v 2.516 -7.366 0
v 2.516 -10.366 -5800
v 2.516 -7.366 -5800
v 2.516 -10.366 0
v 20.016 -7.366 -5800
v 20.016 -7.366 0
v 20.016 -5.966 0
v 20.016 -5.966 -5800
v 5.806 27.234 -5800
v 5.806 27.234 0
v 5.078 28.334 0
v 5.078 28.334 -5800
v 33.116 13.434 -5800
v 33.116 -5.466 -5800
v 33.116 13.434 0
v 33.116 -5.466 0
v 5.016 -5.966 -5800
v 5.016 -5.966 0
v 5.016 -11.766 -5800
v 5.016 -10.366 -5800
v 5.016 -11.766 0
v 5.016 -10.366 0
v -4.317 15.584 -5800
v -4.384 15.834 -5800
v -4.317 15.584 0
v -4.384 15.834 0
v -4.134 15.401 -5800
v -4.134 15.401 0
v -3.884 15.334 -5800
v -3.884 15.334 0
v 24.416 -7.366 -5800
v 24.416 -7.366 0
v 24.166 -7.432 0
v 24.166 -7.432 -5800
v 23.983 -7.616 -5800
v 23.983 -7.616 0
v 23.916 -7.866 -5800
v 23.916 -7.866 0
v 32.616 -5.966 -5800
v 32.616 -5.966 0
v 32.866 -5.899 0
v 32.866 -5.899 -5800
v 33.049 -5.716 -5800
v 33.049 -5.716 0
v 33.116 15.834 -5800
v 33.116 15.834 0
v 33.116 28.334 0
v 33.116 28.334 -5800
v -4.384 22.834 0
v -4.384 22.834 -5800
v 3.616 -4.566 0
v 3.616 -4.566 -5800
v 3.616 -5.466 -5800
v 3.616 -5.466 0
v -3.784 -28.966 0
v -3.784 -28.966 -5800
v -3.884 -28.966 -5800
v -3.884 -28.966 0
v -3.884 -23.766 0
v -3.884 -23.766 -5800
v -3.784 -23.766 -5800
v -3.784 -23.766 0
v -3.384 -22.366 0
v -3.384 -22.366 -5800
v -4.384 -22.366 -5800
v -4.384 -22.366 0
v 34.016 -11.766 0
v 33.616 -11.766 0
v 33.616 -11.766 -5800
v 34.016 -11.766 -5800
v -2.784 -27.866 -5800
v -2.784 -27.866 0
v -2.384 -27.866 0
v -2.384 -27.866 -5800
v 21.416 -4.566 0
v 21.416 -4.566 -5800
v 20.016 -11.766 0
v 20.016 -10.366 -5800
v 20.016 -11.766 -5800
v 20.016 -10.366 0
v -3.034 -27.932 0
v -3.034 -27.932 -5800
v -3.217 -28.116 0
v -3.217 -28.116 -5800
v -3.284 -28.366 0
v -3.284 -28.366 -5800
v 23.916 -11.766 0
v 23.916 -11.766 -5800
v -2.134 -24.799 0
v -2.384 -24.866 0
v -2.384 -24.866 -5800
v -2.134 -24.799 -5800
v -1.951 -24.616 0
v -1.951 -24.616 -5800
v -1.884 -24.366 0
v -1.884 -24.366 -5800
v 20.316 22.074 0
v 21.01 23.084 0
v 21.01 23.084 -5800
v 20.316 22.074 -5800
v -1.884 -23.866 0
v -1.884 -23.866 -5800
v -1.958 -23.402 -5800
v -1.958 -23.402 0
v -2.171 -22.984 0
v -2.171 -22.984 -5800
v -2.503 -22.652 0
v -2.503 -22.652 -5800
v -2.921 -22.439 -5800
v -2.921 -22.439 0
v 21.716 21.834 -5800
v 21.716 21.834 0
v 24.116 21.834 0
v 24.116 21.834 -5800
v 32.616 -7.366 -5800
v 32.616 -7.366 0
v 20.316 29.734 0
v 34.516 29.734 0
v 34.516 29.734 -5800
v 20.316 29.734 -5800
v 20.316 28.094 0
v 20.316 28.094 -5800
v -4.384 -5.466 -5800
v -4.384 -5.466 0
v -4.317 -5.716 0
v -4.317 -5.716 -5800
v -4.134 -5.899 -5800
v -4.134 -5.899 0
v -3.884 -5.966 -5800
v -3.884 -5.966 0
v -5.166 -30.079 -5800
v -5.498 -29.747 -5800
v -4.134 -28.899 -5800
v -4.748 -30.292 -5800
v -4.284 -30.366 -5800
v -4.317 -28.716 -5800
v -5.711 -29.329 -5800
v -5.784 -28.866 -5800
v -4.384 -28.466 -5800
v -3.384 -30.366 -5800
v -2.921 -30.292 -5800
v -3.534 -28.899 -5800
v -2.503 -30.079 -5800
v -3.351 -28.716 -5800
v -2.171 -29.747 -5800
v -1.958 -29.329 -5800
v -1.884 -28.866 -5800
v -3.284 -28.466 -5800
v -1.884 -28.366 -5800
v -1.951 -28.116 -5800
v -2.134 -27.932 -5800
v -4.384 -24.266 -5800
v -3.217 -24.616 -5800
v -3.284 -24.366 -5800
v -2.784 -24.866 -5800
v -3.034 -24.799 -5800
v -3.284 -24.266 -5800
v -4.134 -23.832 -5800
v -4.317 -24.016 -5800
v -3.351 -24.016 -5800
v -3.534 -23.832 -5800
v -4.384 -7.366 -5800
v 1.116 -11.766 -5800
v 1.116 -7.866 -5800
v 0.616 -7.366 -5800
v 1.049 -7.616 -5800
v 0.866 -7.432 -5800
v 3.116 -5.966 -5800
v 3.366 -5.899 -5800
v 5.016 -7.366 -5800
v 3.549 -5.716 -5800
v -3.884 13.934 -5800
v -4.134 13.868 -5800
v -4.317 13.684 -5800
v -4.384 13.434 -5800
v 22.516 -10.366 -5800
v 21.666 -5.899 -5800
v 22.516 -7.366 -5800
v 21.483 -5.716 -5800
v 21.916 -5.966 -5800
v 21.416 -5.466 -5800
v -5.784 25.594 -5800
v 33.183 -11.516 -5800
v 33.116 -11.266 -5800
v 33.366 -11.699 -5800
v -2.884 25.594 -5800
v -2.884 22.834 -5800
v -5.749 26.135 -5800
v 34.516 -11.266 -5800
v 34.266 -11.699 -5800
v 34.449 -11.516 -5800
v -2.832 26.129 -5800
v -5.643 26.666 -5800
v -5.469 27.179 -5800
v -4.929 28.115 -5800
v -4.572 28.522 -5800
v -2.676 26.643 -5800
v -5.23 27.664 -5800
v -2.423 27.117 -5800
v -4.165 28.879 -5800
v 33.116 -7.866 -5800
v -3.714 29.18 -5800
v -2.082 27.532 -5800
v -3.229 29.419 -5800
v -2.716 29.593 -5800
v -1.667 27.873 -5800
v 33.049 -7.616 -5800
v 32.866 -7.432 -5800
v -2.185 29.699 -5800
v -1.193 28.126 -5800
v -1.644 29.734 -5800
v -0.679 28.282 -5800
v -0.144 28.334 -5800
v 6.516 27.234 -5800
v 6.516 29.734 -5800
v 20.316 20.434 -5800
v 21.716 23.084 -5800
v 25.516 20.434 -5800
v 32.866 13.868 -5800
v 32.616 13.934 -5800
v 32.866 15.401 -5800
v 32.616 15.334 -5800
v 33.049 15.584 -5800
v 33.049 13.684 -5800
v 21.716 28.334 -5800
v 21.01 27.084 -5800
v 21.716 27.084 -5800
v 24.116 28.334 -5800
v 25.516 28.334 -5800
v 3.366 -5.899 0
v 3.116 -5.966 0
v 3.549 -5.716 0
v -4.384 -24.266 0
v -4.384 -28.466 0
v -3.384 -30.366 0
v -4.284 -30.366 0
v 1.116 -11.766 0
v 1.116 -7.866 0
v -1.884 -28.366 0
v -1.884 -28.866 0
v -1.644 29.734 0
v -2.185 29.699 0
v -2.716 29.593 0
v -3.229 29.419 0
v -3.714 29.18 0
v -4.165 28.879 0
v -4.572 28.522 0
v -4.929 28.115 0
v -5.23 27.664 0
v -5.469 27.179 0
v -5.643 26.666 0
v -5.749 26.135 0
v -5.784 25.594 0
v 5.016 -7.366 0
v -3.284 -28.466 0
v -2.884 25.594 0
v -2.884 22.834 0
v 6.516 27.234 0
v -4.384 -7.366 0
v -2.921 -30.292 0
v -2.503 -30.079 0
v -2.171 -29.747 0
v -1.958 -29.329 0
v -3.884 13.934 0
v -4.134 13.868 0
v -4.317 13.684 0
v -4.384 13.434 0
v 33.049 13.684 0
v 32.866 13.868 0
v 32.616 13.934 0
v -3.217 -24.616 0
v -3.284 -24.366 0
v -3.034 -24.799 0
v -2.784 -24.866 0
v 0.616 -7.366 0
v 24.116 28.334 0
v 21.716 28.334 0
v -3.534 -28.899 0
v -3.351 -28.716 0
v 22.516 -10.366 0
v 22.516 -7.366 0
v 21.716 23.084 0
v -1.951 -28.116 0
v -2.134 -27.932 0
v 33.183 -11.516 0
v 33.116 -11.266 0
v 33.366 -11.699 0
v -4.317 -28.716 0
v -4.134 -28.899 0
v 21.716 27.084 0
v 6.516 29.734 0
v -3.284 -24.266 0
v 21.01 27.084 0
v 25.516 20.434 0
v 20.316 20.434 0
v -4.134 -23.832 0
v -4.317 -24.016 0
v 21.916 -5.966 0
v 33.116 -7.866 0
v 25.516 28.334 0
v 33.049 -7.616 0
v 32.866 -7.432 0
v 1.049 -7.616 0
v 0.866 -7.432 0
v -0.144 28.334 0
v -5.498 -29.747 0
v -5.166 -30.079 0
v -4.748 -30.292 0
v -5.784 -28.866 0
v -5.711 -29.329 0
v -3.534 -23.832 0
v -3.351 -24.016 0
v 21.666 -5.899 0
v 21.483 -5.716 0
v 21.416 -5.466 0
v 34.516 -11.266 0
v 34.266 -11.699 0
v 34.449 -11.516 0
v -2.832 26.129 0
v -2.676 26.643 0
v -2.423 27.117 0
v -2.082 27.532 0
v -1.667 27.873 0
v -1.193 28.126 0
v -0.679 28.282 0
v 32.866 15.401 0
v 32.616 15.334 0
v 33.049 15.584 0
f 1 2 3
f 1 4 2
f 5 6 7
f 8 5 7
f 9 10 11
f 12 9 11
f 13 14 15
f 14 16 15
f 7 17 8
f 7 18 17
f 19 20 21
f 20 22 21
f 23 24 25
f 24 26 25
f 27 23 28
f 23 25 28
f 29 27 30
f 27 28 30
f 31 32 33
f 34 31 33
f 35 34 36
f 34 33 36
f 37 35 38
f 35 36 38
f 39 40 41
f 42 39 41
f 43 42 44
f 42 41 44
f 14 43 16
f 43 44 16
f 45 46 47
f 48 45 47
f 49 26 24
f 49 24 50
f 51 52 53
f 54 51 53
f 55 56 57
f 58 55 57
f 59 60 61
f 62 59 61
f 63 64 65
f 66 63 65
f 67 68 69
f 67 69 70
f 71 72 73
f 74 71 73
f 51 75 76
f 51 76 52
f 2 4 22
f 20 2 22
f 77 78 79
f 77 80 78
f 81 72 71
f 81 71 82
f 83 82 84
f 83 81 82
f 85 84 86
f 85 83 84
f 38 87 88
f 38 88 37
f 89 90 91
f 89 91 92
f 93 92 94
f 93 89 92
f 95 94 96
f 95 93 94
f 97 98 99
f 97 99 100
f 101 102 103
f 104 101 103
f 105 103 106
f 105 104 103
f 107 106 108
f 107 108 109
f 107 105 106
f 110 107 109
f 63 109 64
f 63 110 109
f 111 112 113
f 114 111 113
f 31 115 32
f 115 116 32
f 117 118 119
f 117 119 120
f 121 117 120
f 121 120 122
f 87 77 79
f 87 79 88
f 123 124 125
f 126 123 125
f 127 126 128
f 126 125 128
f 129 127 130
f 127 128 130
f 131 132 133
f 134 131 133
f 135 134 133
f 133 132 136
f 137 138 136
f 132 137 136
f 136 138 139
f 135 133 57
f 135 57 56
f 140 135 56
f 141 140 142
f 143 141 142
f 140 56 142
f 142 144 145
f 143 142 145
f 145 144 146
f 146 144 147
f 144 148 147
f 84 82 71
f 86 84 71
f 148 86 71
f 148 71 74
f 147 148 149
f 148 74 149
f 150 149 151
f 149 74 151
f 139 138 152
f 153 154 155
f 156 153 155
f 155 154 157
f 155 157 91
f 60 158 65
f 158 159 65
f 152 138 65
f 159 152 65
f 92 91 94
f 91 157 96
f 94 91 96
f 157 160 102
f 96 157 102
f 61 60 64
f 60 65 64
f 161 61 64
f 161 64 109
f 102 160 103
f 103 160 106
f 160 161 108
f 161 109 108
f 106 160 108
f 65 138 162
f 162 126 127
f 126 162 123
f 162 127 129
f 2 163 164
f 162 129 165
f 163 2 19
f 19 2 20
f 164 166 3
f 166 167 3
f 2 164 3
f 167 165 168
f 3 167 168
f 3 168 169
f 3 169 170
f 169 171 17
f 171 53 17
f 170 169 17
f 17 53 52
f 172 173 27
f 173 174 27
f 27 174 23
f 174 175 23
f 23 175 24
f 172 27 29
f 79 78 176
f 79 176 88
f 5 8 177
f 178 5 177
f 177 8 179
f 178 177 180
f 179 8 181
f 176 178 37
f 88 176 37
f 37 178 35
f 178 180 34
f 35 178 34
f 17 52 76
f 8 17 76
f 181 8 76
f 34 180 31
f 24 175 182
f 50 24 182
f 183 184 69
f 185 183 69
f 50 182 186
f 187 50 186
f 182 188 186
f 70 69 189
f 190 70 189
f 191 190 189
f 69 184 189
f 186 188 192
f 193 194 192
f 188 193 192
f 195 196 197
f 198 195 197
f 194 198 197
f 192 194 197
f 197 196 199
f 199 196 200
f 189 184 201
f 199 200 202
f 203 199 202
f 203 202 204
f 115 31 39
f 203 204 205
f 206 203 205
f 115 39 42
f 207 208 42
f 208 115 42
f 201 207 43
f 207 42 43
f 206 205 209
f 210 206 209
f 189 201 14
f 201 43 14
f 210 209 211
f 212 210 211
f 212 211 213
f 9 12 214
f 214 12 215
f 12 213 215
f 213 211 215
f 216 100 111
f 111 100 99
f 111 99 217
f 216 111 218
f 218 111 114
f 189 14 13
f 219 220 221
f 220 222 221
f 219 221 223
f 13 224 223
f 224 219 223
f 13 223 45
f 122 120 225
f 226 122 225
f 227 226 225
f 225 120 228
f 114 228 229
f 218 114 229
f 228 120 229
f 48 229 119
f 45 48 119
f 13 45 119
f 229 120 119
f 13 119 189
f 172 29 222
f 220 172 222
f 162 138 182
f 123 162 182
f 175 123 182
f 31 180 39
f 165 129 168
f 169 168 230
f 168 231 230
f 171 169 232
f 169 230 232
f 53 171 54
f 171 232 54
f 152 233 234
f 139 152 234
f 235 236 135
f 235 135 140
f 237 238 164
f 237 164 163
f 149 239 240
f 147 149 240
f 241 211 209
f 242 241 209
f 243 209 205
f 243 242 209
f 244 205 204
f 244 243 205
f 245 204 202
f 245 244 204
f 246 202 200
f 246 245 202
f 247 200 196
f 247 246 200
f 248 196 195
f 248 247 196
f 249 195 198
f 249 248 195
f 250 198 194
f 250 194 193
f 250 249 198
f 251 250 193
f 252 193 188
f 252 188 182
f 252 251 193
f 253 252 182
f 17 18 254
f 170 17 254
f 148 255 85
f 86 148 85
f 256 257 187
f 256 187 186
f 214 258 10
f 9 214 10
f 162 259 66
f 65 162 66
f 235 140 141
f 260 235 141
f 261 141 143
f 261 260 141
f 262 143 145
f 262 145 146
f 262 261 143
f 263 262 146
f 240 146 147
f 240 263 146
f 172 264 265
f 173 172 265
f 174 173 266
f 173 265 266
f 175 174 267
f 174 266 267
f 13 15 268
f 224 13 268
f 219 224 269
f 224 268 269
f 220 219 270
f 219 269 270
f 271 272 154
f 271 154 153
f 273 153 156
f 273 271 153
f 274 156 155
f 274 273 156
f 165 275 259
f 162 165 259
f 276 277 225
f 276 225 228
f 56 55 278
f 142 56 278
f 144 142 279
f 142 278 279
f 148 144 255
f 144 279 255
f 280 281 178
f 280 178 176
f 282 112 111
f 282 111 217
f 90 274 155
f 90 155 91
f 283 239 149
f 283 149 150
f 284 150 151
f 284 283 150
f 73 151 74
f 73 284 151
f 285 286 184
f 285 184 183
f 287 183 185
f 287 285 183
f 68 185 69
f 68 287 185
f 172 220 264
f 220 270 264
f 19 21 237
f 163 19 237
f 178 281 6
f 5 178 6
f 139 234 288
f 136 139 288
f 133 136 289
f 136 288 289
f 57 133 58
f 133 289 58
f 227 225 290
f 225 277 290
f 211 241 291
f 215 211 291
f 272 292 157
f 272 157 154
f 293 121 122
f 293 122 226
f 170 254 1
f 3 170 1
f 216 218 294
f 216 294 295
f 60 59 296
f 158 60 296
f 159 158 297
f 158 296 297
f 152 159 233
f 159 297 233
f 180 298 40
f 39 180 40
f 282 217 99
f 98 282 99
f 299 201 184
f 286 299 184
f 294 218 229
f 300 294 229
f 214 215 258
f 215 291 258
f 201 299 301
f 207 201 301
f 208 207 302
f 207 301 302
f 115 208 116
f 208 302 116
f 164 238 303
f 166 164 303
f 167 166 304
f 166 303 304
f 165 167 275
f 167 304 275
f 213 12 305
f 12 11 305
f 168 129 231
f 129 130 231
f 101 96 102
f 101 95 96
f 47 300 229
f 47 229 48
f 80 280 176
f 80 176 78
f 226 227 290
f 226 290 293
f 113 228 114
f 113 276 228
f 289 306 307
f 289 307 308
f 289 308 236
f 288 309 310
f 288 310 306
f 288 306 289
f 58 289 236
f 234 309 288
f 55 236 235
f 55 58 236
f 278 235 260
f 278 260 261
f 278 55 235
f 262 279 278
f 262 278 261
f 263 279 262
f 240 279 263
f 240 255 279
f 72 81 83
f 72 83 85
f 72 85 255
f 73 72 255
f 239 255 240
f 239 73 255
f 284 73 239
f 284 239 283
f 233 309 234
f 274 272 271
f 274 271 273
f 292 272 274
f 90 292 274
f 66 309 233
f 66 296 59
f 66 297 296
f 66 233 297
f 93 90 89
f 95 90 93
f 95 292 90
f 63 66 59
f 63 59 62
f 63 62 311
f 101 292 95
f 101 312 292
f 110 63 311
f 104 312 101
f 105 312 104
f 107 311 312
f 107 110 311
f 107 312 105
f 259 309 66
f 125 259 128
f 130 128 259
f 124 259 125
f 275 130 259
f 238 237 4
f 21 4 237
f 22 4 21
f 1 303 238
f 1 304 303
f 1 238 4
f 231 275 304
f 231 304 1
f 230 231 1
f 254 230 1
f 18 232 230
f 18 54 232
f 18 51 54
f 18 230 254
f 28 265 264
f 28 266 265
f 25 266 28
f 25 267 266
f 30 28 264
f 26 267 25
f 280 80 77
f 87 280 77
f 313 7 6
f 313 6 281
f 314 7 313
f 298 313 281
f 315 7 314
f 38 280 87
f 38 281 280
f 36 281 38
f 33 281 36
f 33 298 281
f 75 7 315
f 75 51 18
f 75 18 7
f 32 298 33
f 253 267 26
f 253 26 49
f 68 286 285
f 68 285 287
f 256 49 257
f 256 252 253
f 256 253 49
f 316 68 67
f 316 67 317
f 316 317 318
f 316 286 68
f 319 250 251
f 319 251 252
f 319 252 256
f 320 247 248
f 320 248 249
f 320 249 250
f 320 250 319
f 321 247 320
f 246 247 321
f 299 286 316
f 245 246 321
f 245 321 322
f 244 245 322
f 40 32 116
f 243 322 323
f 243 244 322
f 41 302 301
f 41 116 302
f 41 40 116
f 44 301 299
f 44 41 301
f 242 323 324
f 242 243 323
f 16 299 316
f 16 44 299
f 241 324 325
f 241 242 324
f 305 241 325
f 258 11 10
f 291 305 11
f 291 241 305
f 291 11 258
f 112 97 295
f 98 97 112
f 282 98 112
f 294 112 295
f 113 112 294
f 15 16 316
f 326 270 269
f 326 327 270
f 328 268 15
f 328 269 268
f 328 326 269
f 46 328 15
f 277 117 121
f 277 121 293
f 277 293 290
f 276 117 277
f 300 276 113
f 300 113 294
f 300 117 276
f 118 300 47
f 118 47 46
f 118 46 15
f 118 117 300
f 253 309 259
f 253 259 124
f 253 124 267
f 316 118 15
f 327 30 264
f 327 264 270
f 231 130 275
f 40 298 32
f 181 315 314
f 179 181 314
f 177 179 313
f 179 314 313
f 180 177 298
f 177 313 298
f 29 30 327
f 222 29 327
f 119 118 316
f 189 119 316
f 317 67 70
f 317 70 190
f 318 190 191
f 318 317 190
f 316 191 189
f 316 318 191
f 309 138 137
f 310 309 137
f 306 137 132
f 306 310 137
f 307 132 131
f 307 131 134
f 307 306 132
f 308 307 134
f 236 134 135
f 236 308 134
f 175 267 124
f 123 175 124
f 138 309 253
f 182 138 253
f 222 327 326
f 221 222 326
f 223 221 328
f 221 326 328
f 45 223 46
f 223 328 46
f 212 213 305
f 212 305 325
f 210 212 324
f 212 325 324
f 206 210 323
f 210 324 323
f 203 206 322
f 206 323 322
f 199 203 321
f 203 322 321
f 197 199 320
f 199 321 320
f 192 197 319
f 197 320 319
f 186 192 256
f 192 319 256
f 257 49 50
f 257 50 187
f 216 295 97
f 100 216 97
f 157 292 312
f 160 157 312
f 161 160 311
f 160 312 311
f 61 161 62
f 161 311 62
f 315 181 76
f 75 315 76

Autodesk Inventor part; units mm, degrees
ref_plane "YZ Plane" through (0, 0, 0) normal (1, 0, 0) x (0, 1, 0)
ref_plane "XZ Plane" through (0, 0, 0) normal (0, 1, 0) x (-1, 0, 0)
ref_plane "XY Plane" through (0, 0, 0) normal (0, 0, 1) x (1, 0, 0)
sketch "Boceto1" plane through (0, 0, 0) normal (0, 0, 1) x (1, 0, 0)
  line L0 (33.1157, -5.4655) -> (33.1157, 13.4345)
  line L1 (32.6157, 13.9345) -> (-3.8843, 13.9345)
  line L2 (-4.3843, 13.4345) -> (-4.3843, -5.4655)
  line L3 (-3.8843, 15.3345) -> (32.6157, 15.3345)
  line L4 (34.5157, 29.7345) -> (34.5157, -11.2655)
  line L5 (-5.7843, -28.8655) -> (-5.7843, 25.5945)
  line L6 (33.1157, 15.8345) -> (33.1157, 28.3345)
  line L7 (34.5157, 29.7345) -> (20.3157, 29.7345)
  line L8 (20.3157, 29.7345) -> (20.3157, 28.0945)
  line L9 (24.1157, 28.3345) -> (24.1157, 21.8345)
  line L10 (25.5157, 20.4345) -> (25.5157, 28.3345)
  line L11 (25.5157, 20.4345) -> (20.3157, 20.4345)
  line L12 (20.3157, 20.4345) -> (20.3157, 22.0745)
  line L13 (21.7157, 21.8345) -> (24.1157, 21.8345)
  line L14 (21.7157, 23.0845) -> (21.0099, 23.0845)
  line L15 (21.0099, 23.0845) -> (20.3157, 22.0745)
  line L16 (21.7157, 27.0845) -> (21.0099, 27.0845)
  line L17 (-4.3843, 15.8345) -> (-4.3843, 22.8345)
  line L18 (-4.3843, 22.8345) -> (-2.8843, 22.8345)
  line L19 (-2.8843, 22.8345) -> (-2.8843, 25.5945)
  line L20 (-1.6443, 29.7345) -> (6.5157, 29.7345)
  line L21 (5.0777, 28.3345) -> (-0.1443, 28.3345)
  line L22 (6.5157, 29.7345) -> (6.5157, 27.2345)
  line L23 (6.5157, 27.2345) -> (5.8057, 27.2345)
  line L24 (5.8057, 27.2345) -> (5.0777, 28.3345)
  line L25 (33.1157, -7.8655) -> (33.1157, -11.2655)
  line L26 (33.6157, -11.7655) -> (34.0157, -11.7655)
  line L27 (22.5157, -7.3655) -> (22.5157, -10.3655)
  line L28 (23.9157, -11.7655) -> (23.9157, -7.8655)
  line L29 (1.1157, -7.8655) -> (1.1157, -11.7655)
  line L30 (2.5157, -10.3655) -> (2.5157, -7.3655)
  line L31 (2.5157, -10.3655) -> (5.0157, -10.3655)
  line L32 (5.0157, -10.3655) -> (5.0157, -11.7655)
  line L33 (5.0157, -11.7655) -> (1.1157, -11.7655)
  line L34 (22.5157, -10.3655) -> (20.0157, -10.3655)
  line L35 (20.0157, -10.3655) -> (20.0157, -11.7655)
  line L36 (20.0157, -11.7655) -> (23.9157, -11.7655)
  line L37 (21.4157, -5.4655) -> (21.4157, -4.5655)
  line L38 (21.4157, -4.5655) -> (3.6157, -4.5655)
  line L39 (-3.8843, -5.9655) -> (3.1157, -5.9655)
  line L40 (21.9157, -5.9655) -> (32.6157, -5.9655)
  line L41 (20.0157, -7.3655) -> (20.0157, -5.9655)
  line L42 (5.0157, -5.9655) -> (5.0157, -7.3655)
  line L43 (21.7157, 28.3345) -> (24.1157, 28.3345)
  line L44 (25.5157, 28.3345) -> (33.1157, 28.3345)
  line L45 (32.6157, -7.3655) -> (24.4157, -7.3655)
  line L46 (5.0157, -7.3655) -> (2.5157, -7.3655)
  line L47 (0.6157, -7.3655) -> (-4.3843, -7.3655)
  line L48 (22.5157, -7.3655) -> (20.0157, -7.3655)
  line L49 (22.5157, -7.3655) -> (20.0157, -7.3655)
  line L50 (3.6157, -4.5655) -> (3.6157, -5.4655)
  line L51 (5.0157, -5.9655) -> (20.0157, -5.9655)
  line L52 (20.3157, 28.0945) -> (21.0099, 27.0845)
  line L53 (21.7157, 28.3345) -> (21.7157, 27.0845)
  line L54 (21.7157, 21.8345) -> (21.7157, 23.0845)
  line L55 (-4.2843, -30.3655) -> (-3.3843, -30.3655)
  line L56 (-3.7843, -28.9655) -> (-3.8843, -28.9655)
  line L57 (-3.8843, -23.7655) -> (-3.7843, -23.7655)
  line L58 (-3.3843, -22.3655) -> (-4.3843, -22.3655)
  line L59 (-3.2843, -24.2655) -> (-3.2843, -24.3655)
  line L60 (-2.7843, -24.8655) -> (-2.3843, -24.8655)
  line L61 (-1.8843, -24.3655) -> (-1.8843, -23.8655)
  line L62 (-3.2843, -28.4655) -> (-3.2843, -28.3655)
  line L63 (-2.7843, -27.8655) -> (-2.3843, -27.8655)
  line L64 (-1.8843, -28.3655) -> (-1.8843, -28.8655)
  line L65 (-4.3843, -7.3655) -> (-4.3843, -22.3655)
  line L66 (-4.3843, -24.2655) -> (-4.3843, -28.4655)
  arc A0 (-1.8843, -23.8655) -> (-3.3843, -22.3655) centre (-3.3843, -23.8655) ccw
  arc A1 (-1.6443, 29.7345) -> (-5.7843, 25.5945) centre (-1.6443, 25.5945) ccw
  arc A2 (-0.1443, 28.3345) -> (-2.8843, 25.5945) centre (-0.1443, 25.5945) ccw
  arc A3 (-2.7843, -27.8655) -> (-3.2843, -28.3655) centre (-2.7843, -28.3655) ccw
  arc A4 (-1.8843, -28.3655) -> (-2.3843, -27.8655) centre (-2.3843, -28.3655) ccw
  arc A5 (-3.2843, -24.3655) -> (-2.7843, -24.8655) centre (-2.7843, -24.3655) ccw
  arc A6 (-2.3843, -24.8655) -> (-1.8843, -24.3655) centre (-2.3843, -24.3655) ccw
  arc A7 (1.1157, -7.8655) -> (0.6157, -7.3655) centre (0.6157, -7.8655) ccw
  arc A8 (3.1157, -5.9655) -> (3.6157, -5.4655) centre (3.1157, -5.4655) ccw
  arc A9 (-4.3843, -5.4655) -> (-3.8843, -5.9655) centre (-3.8843, -5.4655) ccw
  arc A10 (24.4157, -7.3655) -> (23.9157, -7.8655) centre (24.4157, -7.8655) ccw
  arc A11 (21.4157, -5.4655) -> (21.9157, -5.9655) centre (21.9157, -5.4655) ccw
  arc A12 (32.6157, -5.9655) -> (33.1157, -5.4655) centre (32.6157, -5.4655) ccw
  arc A13 (33.1157, -7.8655) -> (32.6157, -7.3655) centre (32.6157, -7.8655) ccw
  arc A14 (33.1157, -11.2655) -> (33.6157, -11.7655) centre (33.6157, -11.2655) ccw
  arc A15 (34.0157, -11.7655) -> (34.5157, -11.2655) centre (34.0157, -11.2655) ccw
  arc A16 (-4.3843, 15.8345) -> (-3.8843, 15.3345) centre (-3.8843, 15.8345) ccw
  arc A17 (-3.8843, 13.9345) -> (-4.3843, 13.4345) centre (-3.8843, 13.4345) ccw
  arc A18 (33.1157, 13.4345) -> (32.6157, 13.9345) centre (32.6157, 13.4345) ccw
  arc A19 (32.6157, 15.3345) -> (33.1157, 15.8345) centre (32.6157, 15.8345) ccw
  arc A20 (-3.2843, -24.2655) -> (-3.7843, -23.7655) centre (-3.7843, -24.2655) ccw
  arc A21 (-3.8843, -23.7655) -> (-4.3843, -24.2655) centre (-3.8843, -24.2655) ccw
  arc A22 (-4.3843, -28.4655) -> (-3.8843, -28.9655) centre (-3.8843, -28.4655) ccw
  arc A23 (-3.7843, -28.9655) -> (-3.2843, -28.4655) centre (-3.7843, -28.4655) ccw
  arc A24 (-5.7843, -28.8655) -> (-4.2843, -30.3655) centre (-4.2843, -28.8655) ccw
  arc A25 (-3.3843, -30.3655) -> (-1.8843, -28.8655) centre (-3.3843, -28.8655) ccw
  point P0 (-2.8843, 28.3345)
  point P1 (-5.7843, 29.7345)
  point P2 (22.9157, 20.4345)
  point P3 (-4.3843, -28.9655)
  point P4 (-4.3843, -23.7655)
  point P5 (-1.8843, -22.3655)
  point P6 (-3.2843, -23.7655)
  point P7 (-3.2843, -28.9655)
  point P8 (1.1157, -7.3655)
  point P9 (3.6157, -5.9655)
  point P10 (-4.3843, -5.9655)
  point P11 (23.9157, -7.3655)
  point P12 (21.4157, -5.9655)
  point P13 (33.1157, -5.9655)
  point P14 (33.1157, -7.3655)
  point P15 (-4.3843, 13.9345)
  point P16 (33.1157, 13.9345)
  point P17 (33.1157, 15.3345)
  point P18 (-4.3843, 15.3345)
  point P19 (3.6157, -5.0155)
  point P20 (-4.3843, -26.3655)
  point P21 (-1.8843, -30.3655)
  point P22 (-5.7843, -30.3655)
  point P23 (24.1157, 25.0845)
  dimension "d143" = 22.7
  dimension "d144" = 14.4
  dimension "d148" = 1.4
  dimension "d149" = 1.4
  dimension "d152" = 1.4
  dimension "d153" = 1.4
  dimension "d154" = 1.4
  dimension "d156" = 1.4
  dimension "d157" = 1.4
  dimension "d158" = 41.5
  dimension "d162" = 9.3
  dimension "d163" = 6.5
  dimension "d167" = 1.4
  dimension "d168" = 1.4
  dimension "d169" = 2.5
  dimension "d172" = 1.4
  dimension "d178" = 3
  dimension "d182" = 1.4
  dimension "d183" = 1.4
  dimension "d186" = 1.4
  dimension "d189" = 18.5
  dimension "d191" = 1.4
  dimension "d193" = 1.4
  dimension "d194" = 1.4
  dimension "d196" = 23
  dimension "d197" = 5.2
  dimension "d199" = 40.3
  dimension "d200" = 14.2
  dimension "d202" = 13.8
  dimension "d203" = 1.4
  dimension "d204" = 7.5
  dimension "d205" = 14.4
  dimension "d206" = 37.5
  dimension "d207" = 60.1
  dimension "d208" = 15
  dimension "d209" = 20
  dimension "d210" = 22.8
  dimension "d211" = 2.9
  dimension "d216" = 1.4
  dimension "d217" = 1.4
  dimension "d220" = 1.4
  dimension "d222" = 1.4
  dimension "d223" = 2.5
  dimension "d224" = 2.5
  dimension "d225" = 6.9
  dimension "d226" = 3
  dimension "d227" = 8
  dimension "d230" = 1.1
  dimension "d231" = 1.4
  dimension "d232" = 3
  dimension "d233" = 1.5
  dimension "d234" = 1.5
  dimension "d235" = 6.9
  dimension "d237" = 4.14
  dimension "d238" = 2.74
  dimension "d239" = 0.71
  dimension "d240" = 33.5
  dimension "d241" = 19.9
  dimension "d242" = 6.02
  dimension "d243" = 3.01
  dimension "d244" = 2.4
  dimension "d245" = 4
  dimension "d246" = 2
  dimension "d250" = 111
extrude "Extrusión1" add sketch "Boceto1" against normal blind 5800
properties part number "SP40-02 HOJA PUERTA BATIENTE INT - EXT" material "Aluminio"
